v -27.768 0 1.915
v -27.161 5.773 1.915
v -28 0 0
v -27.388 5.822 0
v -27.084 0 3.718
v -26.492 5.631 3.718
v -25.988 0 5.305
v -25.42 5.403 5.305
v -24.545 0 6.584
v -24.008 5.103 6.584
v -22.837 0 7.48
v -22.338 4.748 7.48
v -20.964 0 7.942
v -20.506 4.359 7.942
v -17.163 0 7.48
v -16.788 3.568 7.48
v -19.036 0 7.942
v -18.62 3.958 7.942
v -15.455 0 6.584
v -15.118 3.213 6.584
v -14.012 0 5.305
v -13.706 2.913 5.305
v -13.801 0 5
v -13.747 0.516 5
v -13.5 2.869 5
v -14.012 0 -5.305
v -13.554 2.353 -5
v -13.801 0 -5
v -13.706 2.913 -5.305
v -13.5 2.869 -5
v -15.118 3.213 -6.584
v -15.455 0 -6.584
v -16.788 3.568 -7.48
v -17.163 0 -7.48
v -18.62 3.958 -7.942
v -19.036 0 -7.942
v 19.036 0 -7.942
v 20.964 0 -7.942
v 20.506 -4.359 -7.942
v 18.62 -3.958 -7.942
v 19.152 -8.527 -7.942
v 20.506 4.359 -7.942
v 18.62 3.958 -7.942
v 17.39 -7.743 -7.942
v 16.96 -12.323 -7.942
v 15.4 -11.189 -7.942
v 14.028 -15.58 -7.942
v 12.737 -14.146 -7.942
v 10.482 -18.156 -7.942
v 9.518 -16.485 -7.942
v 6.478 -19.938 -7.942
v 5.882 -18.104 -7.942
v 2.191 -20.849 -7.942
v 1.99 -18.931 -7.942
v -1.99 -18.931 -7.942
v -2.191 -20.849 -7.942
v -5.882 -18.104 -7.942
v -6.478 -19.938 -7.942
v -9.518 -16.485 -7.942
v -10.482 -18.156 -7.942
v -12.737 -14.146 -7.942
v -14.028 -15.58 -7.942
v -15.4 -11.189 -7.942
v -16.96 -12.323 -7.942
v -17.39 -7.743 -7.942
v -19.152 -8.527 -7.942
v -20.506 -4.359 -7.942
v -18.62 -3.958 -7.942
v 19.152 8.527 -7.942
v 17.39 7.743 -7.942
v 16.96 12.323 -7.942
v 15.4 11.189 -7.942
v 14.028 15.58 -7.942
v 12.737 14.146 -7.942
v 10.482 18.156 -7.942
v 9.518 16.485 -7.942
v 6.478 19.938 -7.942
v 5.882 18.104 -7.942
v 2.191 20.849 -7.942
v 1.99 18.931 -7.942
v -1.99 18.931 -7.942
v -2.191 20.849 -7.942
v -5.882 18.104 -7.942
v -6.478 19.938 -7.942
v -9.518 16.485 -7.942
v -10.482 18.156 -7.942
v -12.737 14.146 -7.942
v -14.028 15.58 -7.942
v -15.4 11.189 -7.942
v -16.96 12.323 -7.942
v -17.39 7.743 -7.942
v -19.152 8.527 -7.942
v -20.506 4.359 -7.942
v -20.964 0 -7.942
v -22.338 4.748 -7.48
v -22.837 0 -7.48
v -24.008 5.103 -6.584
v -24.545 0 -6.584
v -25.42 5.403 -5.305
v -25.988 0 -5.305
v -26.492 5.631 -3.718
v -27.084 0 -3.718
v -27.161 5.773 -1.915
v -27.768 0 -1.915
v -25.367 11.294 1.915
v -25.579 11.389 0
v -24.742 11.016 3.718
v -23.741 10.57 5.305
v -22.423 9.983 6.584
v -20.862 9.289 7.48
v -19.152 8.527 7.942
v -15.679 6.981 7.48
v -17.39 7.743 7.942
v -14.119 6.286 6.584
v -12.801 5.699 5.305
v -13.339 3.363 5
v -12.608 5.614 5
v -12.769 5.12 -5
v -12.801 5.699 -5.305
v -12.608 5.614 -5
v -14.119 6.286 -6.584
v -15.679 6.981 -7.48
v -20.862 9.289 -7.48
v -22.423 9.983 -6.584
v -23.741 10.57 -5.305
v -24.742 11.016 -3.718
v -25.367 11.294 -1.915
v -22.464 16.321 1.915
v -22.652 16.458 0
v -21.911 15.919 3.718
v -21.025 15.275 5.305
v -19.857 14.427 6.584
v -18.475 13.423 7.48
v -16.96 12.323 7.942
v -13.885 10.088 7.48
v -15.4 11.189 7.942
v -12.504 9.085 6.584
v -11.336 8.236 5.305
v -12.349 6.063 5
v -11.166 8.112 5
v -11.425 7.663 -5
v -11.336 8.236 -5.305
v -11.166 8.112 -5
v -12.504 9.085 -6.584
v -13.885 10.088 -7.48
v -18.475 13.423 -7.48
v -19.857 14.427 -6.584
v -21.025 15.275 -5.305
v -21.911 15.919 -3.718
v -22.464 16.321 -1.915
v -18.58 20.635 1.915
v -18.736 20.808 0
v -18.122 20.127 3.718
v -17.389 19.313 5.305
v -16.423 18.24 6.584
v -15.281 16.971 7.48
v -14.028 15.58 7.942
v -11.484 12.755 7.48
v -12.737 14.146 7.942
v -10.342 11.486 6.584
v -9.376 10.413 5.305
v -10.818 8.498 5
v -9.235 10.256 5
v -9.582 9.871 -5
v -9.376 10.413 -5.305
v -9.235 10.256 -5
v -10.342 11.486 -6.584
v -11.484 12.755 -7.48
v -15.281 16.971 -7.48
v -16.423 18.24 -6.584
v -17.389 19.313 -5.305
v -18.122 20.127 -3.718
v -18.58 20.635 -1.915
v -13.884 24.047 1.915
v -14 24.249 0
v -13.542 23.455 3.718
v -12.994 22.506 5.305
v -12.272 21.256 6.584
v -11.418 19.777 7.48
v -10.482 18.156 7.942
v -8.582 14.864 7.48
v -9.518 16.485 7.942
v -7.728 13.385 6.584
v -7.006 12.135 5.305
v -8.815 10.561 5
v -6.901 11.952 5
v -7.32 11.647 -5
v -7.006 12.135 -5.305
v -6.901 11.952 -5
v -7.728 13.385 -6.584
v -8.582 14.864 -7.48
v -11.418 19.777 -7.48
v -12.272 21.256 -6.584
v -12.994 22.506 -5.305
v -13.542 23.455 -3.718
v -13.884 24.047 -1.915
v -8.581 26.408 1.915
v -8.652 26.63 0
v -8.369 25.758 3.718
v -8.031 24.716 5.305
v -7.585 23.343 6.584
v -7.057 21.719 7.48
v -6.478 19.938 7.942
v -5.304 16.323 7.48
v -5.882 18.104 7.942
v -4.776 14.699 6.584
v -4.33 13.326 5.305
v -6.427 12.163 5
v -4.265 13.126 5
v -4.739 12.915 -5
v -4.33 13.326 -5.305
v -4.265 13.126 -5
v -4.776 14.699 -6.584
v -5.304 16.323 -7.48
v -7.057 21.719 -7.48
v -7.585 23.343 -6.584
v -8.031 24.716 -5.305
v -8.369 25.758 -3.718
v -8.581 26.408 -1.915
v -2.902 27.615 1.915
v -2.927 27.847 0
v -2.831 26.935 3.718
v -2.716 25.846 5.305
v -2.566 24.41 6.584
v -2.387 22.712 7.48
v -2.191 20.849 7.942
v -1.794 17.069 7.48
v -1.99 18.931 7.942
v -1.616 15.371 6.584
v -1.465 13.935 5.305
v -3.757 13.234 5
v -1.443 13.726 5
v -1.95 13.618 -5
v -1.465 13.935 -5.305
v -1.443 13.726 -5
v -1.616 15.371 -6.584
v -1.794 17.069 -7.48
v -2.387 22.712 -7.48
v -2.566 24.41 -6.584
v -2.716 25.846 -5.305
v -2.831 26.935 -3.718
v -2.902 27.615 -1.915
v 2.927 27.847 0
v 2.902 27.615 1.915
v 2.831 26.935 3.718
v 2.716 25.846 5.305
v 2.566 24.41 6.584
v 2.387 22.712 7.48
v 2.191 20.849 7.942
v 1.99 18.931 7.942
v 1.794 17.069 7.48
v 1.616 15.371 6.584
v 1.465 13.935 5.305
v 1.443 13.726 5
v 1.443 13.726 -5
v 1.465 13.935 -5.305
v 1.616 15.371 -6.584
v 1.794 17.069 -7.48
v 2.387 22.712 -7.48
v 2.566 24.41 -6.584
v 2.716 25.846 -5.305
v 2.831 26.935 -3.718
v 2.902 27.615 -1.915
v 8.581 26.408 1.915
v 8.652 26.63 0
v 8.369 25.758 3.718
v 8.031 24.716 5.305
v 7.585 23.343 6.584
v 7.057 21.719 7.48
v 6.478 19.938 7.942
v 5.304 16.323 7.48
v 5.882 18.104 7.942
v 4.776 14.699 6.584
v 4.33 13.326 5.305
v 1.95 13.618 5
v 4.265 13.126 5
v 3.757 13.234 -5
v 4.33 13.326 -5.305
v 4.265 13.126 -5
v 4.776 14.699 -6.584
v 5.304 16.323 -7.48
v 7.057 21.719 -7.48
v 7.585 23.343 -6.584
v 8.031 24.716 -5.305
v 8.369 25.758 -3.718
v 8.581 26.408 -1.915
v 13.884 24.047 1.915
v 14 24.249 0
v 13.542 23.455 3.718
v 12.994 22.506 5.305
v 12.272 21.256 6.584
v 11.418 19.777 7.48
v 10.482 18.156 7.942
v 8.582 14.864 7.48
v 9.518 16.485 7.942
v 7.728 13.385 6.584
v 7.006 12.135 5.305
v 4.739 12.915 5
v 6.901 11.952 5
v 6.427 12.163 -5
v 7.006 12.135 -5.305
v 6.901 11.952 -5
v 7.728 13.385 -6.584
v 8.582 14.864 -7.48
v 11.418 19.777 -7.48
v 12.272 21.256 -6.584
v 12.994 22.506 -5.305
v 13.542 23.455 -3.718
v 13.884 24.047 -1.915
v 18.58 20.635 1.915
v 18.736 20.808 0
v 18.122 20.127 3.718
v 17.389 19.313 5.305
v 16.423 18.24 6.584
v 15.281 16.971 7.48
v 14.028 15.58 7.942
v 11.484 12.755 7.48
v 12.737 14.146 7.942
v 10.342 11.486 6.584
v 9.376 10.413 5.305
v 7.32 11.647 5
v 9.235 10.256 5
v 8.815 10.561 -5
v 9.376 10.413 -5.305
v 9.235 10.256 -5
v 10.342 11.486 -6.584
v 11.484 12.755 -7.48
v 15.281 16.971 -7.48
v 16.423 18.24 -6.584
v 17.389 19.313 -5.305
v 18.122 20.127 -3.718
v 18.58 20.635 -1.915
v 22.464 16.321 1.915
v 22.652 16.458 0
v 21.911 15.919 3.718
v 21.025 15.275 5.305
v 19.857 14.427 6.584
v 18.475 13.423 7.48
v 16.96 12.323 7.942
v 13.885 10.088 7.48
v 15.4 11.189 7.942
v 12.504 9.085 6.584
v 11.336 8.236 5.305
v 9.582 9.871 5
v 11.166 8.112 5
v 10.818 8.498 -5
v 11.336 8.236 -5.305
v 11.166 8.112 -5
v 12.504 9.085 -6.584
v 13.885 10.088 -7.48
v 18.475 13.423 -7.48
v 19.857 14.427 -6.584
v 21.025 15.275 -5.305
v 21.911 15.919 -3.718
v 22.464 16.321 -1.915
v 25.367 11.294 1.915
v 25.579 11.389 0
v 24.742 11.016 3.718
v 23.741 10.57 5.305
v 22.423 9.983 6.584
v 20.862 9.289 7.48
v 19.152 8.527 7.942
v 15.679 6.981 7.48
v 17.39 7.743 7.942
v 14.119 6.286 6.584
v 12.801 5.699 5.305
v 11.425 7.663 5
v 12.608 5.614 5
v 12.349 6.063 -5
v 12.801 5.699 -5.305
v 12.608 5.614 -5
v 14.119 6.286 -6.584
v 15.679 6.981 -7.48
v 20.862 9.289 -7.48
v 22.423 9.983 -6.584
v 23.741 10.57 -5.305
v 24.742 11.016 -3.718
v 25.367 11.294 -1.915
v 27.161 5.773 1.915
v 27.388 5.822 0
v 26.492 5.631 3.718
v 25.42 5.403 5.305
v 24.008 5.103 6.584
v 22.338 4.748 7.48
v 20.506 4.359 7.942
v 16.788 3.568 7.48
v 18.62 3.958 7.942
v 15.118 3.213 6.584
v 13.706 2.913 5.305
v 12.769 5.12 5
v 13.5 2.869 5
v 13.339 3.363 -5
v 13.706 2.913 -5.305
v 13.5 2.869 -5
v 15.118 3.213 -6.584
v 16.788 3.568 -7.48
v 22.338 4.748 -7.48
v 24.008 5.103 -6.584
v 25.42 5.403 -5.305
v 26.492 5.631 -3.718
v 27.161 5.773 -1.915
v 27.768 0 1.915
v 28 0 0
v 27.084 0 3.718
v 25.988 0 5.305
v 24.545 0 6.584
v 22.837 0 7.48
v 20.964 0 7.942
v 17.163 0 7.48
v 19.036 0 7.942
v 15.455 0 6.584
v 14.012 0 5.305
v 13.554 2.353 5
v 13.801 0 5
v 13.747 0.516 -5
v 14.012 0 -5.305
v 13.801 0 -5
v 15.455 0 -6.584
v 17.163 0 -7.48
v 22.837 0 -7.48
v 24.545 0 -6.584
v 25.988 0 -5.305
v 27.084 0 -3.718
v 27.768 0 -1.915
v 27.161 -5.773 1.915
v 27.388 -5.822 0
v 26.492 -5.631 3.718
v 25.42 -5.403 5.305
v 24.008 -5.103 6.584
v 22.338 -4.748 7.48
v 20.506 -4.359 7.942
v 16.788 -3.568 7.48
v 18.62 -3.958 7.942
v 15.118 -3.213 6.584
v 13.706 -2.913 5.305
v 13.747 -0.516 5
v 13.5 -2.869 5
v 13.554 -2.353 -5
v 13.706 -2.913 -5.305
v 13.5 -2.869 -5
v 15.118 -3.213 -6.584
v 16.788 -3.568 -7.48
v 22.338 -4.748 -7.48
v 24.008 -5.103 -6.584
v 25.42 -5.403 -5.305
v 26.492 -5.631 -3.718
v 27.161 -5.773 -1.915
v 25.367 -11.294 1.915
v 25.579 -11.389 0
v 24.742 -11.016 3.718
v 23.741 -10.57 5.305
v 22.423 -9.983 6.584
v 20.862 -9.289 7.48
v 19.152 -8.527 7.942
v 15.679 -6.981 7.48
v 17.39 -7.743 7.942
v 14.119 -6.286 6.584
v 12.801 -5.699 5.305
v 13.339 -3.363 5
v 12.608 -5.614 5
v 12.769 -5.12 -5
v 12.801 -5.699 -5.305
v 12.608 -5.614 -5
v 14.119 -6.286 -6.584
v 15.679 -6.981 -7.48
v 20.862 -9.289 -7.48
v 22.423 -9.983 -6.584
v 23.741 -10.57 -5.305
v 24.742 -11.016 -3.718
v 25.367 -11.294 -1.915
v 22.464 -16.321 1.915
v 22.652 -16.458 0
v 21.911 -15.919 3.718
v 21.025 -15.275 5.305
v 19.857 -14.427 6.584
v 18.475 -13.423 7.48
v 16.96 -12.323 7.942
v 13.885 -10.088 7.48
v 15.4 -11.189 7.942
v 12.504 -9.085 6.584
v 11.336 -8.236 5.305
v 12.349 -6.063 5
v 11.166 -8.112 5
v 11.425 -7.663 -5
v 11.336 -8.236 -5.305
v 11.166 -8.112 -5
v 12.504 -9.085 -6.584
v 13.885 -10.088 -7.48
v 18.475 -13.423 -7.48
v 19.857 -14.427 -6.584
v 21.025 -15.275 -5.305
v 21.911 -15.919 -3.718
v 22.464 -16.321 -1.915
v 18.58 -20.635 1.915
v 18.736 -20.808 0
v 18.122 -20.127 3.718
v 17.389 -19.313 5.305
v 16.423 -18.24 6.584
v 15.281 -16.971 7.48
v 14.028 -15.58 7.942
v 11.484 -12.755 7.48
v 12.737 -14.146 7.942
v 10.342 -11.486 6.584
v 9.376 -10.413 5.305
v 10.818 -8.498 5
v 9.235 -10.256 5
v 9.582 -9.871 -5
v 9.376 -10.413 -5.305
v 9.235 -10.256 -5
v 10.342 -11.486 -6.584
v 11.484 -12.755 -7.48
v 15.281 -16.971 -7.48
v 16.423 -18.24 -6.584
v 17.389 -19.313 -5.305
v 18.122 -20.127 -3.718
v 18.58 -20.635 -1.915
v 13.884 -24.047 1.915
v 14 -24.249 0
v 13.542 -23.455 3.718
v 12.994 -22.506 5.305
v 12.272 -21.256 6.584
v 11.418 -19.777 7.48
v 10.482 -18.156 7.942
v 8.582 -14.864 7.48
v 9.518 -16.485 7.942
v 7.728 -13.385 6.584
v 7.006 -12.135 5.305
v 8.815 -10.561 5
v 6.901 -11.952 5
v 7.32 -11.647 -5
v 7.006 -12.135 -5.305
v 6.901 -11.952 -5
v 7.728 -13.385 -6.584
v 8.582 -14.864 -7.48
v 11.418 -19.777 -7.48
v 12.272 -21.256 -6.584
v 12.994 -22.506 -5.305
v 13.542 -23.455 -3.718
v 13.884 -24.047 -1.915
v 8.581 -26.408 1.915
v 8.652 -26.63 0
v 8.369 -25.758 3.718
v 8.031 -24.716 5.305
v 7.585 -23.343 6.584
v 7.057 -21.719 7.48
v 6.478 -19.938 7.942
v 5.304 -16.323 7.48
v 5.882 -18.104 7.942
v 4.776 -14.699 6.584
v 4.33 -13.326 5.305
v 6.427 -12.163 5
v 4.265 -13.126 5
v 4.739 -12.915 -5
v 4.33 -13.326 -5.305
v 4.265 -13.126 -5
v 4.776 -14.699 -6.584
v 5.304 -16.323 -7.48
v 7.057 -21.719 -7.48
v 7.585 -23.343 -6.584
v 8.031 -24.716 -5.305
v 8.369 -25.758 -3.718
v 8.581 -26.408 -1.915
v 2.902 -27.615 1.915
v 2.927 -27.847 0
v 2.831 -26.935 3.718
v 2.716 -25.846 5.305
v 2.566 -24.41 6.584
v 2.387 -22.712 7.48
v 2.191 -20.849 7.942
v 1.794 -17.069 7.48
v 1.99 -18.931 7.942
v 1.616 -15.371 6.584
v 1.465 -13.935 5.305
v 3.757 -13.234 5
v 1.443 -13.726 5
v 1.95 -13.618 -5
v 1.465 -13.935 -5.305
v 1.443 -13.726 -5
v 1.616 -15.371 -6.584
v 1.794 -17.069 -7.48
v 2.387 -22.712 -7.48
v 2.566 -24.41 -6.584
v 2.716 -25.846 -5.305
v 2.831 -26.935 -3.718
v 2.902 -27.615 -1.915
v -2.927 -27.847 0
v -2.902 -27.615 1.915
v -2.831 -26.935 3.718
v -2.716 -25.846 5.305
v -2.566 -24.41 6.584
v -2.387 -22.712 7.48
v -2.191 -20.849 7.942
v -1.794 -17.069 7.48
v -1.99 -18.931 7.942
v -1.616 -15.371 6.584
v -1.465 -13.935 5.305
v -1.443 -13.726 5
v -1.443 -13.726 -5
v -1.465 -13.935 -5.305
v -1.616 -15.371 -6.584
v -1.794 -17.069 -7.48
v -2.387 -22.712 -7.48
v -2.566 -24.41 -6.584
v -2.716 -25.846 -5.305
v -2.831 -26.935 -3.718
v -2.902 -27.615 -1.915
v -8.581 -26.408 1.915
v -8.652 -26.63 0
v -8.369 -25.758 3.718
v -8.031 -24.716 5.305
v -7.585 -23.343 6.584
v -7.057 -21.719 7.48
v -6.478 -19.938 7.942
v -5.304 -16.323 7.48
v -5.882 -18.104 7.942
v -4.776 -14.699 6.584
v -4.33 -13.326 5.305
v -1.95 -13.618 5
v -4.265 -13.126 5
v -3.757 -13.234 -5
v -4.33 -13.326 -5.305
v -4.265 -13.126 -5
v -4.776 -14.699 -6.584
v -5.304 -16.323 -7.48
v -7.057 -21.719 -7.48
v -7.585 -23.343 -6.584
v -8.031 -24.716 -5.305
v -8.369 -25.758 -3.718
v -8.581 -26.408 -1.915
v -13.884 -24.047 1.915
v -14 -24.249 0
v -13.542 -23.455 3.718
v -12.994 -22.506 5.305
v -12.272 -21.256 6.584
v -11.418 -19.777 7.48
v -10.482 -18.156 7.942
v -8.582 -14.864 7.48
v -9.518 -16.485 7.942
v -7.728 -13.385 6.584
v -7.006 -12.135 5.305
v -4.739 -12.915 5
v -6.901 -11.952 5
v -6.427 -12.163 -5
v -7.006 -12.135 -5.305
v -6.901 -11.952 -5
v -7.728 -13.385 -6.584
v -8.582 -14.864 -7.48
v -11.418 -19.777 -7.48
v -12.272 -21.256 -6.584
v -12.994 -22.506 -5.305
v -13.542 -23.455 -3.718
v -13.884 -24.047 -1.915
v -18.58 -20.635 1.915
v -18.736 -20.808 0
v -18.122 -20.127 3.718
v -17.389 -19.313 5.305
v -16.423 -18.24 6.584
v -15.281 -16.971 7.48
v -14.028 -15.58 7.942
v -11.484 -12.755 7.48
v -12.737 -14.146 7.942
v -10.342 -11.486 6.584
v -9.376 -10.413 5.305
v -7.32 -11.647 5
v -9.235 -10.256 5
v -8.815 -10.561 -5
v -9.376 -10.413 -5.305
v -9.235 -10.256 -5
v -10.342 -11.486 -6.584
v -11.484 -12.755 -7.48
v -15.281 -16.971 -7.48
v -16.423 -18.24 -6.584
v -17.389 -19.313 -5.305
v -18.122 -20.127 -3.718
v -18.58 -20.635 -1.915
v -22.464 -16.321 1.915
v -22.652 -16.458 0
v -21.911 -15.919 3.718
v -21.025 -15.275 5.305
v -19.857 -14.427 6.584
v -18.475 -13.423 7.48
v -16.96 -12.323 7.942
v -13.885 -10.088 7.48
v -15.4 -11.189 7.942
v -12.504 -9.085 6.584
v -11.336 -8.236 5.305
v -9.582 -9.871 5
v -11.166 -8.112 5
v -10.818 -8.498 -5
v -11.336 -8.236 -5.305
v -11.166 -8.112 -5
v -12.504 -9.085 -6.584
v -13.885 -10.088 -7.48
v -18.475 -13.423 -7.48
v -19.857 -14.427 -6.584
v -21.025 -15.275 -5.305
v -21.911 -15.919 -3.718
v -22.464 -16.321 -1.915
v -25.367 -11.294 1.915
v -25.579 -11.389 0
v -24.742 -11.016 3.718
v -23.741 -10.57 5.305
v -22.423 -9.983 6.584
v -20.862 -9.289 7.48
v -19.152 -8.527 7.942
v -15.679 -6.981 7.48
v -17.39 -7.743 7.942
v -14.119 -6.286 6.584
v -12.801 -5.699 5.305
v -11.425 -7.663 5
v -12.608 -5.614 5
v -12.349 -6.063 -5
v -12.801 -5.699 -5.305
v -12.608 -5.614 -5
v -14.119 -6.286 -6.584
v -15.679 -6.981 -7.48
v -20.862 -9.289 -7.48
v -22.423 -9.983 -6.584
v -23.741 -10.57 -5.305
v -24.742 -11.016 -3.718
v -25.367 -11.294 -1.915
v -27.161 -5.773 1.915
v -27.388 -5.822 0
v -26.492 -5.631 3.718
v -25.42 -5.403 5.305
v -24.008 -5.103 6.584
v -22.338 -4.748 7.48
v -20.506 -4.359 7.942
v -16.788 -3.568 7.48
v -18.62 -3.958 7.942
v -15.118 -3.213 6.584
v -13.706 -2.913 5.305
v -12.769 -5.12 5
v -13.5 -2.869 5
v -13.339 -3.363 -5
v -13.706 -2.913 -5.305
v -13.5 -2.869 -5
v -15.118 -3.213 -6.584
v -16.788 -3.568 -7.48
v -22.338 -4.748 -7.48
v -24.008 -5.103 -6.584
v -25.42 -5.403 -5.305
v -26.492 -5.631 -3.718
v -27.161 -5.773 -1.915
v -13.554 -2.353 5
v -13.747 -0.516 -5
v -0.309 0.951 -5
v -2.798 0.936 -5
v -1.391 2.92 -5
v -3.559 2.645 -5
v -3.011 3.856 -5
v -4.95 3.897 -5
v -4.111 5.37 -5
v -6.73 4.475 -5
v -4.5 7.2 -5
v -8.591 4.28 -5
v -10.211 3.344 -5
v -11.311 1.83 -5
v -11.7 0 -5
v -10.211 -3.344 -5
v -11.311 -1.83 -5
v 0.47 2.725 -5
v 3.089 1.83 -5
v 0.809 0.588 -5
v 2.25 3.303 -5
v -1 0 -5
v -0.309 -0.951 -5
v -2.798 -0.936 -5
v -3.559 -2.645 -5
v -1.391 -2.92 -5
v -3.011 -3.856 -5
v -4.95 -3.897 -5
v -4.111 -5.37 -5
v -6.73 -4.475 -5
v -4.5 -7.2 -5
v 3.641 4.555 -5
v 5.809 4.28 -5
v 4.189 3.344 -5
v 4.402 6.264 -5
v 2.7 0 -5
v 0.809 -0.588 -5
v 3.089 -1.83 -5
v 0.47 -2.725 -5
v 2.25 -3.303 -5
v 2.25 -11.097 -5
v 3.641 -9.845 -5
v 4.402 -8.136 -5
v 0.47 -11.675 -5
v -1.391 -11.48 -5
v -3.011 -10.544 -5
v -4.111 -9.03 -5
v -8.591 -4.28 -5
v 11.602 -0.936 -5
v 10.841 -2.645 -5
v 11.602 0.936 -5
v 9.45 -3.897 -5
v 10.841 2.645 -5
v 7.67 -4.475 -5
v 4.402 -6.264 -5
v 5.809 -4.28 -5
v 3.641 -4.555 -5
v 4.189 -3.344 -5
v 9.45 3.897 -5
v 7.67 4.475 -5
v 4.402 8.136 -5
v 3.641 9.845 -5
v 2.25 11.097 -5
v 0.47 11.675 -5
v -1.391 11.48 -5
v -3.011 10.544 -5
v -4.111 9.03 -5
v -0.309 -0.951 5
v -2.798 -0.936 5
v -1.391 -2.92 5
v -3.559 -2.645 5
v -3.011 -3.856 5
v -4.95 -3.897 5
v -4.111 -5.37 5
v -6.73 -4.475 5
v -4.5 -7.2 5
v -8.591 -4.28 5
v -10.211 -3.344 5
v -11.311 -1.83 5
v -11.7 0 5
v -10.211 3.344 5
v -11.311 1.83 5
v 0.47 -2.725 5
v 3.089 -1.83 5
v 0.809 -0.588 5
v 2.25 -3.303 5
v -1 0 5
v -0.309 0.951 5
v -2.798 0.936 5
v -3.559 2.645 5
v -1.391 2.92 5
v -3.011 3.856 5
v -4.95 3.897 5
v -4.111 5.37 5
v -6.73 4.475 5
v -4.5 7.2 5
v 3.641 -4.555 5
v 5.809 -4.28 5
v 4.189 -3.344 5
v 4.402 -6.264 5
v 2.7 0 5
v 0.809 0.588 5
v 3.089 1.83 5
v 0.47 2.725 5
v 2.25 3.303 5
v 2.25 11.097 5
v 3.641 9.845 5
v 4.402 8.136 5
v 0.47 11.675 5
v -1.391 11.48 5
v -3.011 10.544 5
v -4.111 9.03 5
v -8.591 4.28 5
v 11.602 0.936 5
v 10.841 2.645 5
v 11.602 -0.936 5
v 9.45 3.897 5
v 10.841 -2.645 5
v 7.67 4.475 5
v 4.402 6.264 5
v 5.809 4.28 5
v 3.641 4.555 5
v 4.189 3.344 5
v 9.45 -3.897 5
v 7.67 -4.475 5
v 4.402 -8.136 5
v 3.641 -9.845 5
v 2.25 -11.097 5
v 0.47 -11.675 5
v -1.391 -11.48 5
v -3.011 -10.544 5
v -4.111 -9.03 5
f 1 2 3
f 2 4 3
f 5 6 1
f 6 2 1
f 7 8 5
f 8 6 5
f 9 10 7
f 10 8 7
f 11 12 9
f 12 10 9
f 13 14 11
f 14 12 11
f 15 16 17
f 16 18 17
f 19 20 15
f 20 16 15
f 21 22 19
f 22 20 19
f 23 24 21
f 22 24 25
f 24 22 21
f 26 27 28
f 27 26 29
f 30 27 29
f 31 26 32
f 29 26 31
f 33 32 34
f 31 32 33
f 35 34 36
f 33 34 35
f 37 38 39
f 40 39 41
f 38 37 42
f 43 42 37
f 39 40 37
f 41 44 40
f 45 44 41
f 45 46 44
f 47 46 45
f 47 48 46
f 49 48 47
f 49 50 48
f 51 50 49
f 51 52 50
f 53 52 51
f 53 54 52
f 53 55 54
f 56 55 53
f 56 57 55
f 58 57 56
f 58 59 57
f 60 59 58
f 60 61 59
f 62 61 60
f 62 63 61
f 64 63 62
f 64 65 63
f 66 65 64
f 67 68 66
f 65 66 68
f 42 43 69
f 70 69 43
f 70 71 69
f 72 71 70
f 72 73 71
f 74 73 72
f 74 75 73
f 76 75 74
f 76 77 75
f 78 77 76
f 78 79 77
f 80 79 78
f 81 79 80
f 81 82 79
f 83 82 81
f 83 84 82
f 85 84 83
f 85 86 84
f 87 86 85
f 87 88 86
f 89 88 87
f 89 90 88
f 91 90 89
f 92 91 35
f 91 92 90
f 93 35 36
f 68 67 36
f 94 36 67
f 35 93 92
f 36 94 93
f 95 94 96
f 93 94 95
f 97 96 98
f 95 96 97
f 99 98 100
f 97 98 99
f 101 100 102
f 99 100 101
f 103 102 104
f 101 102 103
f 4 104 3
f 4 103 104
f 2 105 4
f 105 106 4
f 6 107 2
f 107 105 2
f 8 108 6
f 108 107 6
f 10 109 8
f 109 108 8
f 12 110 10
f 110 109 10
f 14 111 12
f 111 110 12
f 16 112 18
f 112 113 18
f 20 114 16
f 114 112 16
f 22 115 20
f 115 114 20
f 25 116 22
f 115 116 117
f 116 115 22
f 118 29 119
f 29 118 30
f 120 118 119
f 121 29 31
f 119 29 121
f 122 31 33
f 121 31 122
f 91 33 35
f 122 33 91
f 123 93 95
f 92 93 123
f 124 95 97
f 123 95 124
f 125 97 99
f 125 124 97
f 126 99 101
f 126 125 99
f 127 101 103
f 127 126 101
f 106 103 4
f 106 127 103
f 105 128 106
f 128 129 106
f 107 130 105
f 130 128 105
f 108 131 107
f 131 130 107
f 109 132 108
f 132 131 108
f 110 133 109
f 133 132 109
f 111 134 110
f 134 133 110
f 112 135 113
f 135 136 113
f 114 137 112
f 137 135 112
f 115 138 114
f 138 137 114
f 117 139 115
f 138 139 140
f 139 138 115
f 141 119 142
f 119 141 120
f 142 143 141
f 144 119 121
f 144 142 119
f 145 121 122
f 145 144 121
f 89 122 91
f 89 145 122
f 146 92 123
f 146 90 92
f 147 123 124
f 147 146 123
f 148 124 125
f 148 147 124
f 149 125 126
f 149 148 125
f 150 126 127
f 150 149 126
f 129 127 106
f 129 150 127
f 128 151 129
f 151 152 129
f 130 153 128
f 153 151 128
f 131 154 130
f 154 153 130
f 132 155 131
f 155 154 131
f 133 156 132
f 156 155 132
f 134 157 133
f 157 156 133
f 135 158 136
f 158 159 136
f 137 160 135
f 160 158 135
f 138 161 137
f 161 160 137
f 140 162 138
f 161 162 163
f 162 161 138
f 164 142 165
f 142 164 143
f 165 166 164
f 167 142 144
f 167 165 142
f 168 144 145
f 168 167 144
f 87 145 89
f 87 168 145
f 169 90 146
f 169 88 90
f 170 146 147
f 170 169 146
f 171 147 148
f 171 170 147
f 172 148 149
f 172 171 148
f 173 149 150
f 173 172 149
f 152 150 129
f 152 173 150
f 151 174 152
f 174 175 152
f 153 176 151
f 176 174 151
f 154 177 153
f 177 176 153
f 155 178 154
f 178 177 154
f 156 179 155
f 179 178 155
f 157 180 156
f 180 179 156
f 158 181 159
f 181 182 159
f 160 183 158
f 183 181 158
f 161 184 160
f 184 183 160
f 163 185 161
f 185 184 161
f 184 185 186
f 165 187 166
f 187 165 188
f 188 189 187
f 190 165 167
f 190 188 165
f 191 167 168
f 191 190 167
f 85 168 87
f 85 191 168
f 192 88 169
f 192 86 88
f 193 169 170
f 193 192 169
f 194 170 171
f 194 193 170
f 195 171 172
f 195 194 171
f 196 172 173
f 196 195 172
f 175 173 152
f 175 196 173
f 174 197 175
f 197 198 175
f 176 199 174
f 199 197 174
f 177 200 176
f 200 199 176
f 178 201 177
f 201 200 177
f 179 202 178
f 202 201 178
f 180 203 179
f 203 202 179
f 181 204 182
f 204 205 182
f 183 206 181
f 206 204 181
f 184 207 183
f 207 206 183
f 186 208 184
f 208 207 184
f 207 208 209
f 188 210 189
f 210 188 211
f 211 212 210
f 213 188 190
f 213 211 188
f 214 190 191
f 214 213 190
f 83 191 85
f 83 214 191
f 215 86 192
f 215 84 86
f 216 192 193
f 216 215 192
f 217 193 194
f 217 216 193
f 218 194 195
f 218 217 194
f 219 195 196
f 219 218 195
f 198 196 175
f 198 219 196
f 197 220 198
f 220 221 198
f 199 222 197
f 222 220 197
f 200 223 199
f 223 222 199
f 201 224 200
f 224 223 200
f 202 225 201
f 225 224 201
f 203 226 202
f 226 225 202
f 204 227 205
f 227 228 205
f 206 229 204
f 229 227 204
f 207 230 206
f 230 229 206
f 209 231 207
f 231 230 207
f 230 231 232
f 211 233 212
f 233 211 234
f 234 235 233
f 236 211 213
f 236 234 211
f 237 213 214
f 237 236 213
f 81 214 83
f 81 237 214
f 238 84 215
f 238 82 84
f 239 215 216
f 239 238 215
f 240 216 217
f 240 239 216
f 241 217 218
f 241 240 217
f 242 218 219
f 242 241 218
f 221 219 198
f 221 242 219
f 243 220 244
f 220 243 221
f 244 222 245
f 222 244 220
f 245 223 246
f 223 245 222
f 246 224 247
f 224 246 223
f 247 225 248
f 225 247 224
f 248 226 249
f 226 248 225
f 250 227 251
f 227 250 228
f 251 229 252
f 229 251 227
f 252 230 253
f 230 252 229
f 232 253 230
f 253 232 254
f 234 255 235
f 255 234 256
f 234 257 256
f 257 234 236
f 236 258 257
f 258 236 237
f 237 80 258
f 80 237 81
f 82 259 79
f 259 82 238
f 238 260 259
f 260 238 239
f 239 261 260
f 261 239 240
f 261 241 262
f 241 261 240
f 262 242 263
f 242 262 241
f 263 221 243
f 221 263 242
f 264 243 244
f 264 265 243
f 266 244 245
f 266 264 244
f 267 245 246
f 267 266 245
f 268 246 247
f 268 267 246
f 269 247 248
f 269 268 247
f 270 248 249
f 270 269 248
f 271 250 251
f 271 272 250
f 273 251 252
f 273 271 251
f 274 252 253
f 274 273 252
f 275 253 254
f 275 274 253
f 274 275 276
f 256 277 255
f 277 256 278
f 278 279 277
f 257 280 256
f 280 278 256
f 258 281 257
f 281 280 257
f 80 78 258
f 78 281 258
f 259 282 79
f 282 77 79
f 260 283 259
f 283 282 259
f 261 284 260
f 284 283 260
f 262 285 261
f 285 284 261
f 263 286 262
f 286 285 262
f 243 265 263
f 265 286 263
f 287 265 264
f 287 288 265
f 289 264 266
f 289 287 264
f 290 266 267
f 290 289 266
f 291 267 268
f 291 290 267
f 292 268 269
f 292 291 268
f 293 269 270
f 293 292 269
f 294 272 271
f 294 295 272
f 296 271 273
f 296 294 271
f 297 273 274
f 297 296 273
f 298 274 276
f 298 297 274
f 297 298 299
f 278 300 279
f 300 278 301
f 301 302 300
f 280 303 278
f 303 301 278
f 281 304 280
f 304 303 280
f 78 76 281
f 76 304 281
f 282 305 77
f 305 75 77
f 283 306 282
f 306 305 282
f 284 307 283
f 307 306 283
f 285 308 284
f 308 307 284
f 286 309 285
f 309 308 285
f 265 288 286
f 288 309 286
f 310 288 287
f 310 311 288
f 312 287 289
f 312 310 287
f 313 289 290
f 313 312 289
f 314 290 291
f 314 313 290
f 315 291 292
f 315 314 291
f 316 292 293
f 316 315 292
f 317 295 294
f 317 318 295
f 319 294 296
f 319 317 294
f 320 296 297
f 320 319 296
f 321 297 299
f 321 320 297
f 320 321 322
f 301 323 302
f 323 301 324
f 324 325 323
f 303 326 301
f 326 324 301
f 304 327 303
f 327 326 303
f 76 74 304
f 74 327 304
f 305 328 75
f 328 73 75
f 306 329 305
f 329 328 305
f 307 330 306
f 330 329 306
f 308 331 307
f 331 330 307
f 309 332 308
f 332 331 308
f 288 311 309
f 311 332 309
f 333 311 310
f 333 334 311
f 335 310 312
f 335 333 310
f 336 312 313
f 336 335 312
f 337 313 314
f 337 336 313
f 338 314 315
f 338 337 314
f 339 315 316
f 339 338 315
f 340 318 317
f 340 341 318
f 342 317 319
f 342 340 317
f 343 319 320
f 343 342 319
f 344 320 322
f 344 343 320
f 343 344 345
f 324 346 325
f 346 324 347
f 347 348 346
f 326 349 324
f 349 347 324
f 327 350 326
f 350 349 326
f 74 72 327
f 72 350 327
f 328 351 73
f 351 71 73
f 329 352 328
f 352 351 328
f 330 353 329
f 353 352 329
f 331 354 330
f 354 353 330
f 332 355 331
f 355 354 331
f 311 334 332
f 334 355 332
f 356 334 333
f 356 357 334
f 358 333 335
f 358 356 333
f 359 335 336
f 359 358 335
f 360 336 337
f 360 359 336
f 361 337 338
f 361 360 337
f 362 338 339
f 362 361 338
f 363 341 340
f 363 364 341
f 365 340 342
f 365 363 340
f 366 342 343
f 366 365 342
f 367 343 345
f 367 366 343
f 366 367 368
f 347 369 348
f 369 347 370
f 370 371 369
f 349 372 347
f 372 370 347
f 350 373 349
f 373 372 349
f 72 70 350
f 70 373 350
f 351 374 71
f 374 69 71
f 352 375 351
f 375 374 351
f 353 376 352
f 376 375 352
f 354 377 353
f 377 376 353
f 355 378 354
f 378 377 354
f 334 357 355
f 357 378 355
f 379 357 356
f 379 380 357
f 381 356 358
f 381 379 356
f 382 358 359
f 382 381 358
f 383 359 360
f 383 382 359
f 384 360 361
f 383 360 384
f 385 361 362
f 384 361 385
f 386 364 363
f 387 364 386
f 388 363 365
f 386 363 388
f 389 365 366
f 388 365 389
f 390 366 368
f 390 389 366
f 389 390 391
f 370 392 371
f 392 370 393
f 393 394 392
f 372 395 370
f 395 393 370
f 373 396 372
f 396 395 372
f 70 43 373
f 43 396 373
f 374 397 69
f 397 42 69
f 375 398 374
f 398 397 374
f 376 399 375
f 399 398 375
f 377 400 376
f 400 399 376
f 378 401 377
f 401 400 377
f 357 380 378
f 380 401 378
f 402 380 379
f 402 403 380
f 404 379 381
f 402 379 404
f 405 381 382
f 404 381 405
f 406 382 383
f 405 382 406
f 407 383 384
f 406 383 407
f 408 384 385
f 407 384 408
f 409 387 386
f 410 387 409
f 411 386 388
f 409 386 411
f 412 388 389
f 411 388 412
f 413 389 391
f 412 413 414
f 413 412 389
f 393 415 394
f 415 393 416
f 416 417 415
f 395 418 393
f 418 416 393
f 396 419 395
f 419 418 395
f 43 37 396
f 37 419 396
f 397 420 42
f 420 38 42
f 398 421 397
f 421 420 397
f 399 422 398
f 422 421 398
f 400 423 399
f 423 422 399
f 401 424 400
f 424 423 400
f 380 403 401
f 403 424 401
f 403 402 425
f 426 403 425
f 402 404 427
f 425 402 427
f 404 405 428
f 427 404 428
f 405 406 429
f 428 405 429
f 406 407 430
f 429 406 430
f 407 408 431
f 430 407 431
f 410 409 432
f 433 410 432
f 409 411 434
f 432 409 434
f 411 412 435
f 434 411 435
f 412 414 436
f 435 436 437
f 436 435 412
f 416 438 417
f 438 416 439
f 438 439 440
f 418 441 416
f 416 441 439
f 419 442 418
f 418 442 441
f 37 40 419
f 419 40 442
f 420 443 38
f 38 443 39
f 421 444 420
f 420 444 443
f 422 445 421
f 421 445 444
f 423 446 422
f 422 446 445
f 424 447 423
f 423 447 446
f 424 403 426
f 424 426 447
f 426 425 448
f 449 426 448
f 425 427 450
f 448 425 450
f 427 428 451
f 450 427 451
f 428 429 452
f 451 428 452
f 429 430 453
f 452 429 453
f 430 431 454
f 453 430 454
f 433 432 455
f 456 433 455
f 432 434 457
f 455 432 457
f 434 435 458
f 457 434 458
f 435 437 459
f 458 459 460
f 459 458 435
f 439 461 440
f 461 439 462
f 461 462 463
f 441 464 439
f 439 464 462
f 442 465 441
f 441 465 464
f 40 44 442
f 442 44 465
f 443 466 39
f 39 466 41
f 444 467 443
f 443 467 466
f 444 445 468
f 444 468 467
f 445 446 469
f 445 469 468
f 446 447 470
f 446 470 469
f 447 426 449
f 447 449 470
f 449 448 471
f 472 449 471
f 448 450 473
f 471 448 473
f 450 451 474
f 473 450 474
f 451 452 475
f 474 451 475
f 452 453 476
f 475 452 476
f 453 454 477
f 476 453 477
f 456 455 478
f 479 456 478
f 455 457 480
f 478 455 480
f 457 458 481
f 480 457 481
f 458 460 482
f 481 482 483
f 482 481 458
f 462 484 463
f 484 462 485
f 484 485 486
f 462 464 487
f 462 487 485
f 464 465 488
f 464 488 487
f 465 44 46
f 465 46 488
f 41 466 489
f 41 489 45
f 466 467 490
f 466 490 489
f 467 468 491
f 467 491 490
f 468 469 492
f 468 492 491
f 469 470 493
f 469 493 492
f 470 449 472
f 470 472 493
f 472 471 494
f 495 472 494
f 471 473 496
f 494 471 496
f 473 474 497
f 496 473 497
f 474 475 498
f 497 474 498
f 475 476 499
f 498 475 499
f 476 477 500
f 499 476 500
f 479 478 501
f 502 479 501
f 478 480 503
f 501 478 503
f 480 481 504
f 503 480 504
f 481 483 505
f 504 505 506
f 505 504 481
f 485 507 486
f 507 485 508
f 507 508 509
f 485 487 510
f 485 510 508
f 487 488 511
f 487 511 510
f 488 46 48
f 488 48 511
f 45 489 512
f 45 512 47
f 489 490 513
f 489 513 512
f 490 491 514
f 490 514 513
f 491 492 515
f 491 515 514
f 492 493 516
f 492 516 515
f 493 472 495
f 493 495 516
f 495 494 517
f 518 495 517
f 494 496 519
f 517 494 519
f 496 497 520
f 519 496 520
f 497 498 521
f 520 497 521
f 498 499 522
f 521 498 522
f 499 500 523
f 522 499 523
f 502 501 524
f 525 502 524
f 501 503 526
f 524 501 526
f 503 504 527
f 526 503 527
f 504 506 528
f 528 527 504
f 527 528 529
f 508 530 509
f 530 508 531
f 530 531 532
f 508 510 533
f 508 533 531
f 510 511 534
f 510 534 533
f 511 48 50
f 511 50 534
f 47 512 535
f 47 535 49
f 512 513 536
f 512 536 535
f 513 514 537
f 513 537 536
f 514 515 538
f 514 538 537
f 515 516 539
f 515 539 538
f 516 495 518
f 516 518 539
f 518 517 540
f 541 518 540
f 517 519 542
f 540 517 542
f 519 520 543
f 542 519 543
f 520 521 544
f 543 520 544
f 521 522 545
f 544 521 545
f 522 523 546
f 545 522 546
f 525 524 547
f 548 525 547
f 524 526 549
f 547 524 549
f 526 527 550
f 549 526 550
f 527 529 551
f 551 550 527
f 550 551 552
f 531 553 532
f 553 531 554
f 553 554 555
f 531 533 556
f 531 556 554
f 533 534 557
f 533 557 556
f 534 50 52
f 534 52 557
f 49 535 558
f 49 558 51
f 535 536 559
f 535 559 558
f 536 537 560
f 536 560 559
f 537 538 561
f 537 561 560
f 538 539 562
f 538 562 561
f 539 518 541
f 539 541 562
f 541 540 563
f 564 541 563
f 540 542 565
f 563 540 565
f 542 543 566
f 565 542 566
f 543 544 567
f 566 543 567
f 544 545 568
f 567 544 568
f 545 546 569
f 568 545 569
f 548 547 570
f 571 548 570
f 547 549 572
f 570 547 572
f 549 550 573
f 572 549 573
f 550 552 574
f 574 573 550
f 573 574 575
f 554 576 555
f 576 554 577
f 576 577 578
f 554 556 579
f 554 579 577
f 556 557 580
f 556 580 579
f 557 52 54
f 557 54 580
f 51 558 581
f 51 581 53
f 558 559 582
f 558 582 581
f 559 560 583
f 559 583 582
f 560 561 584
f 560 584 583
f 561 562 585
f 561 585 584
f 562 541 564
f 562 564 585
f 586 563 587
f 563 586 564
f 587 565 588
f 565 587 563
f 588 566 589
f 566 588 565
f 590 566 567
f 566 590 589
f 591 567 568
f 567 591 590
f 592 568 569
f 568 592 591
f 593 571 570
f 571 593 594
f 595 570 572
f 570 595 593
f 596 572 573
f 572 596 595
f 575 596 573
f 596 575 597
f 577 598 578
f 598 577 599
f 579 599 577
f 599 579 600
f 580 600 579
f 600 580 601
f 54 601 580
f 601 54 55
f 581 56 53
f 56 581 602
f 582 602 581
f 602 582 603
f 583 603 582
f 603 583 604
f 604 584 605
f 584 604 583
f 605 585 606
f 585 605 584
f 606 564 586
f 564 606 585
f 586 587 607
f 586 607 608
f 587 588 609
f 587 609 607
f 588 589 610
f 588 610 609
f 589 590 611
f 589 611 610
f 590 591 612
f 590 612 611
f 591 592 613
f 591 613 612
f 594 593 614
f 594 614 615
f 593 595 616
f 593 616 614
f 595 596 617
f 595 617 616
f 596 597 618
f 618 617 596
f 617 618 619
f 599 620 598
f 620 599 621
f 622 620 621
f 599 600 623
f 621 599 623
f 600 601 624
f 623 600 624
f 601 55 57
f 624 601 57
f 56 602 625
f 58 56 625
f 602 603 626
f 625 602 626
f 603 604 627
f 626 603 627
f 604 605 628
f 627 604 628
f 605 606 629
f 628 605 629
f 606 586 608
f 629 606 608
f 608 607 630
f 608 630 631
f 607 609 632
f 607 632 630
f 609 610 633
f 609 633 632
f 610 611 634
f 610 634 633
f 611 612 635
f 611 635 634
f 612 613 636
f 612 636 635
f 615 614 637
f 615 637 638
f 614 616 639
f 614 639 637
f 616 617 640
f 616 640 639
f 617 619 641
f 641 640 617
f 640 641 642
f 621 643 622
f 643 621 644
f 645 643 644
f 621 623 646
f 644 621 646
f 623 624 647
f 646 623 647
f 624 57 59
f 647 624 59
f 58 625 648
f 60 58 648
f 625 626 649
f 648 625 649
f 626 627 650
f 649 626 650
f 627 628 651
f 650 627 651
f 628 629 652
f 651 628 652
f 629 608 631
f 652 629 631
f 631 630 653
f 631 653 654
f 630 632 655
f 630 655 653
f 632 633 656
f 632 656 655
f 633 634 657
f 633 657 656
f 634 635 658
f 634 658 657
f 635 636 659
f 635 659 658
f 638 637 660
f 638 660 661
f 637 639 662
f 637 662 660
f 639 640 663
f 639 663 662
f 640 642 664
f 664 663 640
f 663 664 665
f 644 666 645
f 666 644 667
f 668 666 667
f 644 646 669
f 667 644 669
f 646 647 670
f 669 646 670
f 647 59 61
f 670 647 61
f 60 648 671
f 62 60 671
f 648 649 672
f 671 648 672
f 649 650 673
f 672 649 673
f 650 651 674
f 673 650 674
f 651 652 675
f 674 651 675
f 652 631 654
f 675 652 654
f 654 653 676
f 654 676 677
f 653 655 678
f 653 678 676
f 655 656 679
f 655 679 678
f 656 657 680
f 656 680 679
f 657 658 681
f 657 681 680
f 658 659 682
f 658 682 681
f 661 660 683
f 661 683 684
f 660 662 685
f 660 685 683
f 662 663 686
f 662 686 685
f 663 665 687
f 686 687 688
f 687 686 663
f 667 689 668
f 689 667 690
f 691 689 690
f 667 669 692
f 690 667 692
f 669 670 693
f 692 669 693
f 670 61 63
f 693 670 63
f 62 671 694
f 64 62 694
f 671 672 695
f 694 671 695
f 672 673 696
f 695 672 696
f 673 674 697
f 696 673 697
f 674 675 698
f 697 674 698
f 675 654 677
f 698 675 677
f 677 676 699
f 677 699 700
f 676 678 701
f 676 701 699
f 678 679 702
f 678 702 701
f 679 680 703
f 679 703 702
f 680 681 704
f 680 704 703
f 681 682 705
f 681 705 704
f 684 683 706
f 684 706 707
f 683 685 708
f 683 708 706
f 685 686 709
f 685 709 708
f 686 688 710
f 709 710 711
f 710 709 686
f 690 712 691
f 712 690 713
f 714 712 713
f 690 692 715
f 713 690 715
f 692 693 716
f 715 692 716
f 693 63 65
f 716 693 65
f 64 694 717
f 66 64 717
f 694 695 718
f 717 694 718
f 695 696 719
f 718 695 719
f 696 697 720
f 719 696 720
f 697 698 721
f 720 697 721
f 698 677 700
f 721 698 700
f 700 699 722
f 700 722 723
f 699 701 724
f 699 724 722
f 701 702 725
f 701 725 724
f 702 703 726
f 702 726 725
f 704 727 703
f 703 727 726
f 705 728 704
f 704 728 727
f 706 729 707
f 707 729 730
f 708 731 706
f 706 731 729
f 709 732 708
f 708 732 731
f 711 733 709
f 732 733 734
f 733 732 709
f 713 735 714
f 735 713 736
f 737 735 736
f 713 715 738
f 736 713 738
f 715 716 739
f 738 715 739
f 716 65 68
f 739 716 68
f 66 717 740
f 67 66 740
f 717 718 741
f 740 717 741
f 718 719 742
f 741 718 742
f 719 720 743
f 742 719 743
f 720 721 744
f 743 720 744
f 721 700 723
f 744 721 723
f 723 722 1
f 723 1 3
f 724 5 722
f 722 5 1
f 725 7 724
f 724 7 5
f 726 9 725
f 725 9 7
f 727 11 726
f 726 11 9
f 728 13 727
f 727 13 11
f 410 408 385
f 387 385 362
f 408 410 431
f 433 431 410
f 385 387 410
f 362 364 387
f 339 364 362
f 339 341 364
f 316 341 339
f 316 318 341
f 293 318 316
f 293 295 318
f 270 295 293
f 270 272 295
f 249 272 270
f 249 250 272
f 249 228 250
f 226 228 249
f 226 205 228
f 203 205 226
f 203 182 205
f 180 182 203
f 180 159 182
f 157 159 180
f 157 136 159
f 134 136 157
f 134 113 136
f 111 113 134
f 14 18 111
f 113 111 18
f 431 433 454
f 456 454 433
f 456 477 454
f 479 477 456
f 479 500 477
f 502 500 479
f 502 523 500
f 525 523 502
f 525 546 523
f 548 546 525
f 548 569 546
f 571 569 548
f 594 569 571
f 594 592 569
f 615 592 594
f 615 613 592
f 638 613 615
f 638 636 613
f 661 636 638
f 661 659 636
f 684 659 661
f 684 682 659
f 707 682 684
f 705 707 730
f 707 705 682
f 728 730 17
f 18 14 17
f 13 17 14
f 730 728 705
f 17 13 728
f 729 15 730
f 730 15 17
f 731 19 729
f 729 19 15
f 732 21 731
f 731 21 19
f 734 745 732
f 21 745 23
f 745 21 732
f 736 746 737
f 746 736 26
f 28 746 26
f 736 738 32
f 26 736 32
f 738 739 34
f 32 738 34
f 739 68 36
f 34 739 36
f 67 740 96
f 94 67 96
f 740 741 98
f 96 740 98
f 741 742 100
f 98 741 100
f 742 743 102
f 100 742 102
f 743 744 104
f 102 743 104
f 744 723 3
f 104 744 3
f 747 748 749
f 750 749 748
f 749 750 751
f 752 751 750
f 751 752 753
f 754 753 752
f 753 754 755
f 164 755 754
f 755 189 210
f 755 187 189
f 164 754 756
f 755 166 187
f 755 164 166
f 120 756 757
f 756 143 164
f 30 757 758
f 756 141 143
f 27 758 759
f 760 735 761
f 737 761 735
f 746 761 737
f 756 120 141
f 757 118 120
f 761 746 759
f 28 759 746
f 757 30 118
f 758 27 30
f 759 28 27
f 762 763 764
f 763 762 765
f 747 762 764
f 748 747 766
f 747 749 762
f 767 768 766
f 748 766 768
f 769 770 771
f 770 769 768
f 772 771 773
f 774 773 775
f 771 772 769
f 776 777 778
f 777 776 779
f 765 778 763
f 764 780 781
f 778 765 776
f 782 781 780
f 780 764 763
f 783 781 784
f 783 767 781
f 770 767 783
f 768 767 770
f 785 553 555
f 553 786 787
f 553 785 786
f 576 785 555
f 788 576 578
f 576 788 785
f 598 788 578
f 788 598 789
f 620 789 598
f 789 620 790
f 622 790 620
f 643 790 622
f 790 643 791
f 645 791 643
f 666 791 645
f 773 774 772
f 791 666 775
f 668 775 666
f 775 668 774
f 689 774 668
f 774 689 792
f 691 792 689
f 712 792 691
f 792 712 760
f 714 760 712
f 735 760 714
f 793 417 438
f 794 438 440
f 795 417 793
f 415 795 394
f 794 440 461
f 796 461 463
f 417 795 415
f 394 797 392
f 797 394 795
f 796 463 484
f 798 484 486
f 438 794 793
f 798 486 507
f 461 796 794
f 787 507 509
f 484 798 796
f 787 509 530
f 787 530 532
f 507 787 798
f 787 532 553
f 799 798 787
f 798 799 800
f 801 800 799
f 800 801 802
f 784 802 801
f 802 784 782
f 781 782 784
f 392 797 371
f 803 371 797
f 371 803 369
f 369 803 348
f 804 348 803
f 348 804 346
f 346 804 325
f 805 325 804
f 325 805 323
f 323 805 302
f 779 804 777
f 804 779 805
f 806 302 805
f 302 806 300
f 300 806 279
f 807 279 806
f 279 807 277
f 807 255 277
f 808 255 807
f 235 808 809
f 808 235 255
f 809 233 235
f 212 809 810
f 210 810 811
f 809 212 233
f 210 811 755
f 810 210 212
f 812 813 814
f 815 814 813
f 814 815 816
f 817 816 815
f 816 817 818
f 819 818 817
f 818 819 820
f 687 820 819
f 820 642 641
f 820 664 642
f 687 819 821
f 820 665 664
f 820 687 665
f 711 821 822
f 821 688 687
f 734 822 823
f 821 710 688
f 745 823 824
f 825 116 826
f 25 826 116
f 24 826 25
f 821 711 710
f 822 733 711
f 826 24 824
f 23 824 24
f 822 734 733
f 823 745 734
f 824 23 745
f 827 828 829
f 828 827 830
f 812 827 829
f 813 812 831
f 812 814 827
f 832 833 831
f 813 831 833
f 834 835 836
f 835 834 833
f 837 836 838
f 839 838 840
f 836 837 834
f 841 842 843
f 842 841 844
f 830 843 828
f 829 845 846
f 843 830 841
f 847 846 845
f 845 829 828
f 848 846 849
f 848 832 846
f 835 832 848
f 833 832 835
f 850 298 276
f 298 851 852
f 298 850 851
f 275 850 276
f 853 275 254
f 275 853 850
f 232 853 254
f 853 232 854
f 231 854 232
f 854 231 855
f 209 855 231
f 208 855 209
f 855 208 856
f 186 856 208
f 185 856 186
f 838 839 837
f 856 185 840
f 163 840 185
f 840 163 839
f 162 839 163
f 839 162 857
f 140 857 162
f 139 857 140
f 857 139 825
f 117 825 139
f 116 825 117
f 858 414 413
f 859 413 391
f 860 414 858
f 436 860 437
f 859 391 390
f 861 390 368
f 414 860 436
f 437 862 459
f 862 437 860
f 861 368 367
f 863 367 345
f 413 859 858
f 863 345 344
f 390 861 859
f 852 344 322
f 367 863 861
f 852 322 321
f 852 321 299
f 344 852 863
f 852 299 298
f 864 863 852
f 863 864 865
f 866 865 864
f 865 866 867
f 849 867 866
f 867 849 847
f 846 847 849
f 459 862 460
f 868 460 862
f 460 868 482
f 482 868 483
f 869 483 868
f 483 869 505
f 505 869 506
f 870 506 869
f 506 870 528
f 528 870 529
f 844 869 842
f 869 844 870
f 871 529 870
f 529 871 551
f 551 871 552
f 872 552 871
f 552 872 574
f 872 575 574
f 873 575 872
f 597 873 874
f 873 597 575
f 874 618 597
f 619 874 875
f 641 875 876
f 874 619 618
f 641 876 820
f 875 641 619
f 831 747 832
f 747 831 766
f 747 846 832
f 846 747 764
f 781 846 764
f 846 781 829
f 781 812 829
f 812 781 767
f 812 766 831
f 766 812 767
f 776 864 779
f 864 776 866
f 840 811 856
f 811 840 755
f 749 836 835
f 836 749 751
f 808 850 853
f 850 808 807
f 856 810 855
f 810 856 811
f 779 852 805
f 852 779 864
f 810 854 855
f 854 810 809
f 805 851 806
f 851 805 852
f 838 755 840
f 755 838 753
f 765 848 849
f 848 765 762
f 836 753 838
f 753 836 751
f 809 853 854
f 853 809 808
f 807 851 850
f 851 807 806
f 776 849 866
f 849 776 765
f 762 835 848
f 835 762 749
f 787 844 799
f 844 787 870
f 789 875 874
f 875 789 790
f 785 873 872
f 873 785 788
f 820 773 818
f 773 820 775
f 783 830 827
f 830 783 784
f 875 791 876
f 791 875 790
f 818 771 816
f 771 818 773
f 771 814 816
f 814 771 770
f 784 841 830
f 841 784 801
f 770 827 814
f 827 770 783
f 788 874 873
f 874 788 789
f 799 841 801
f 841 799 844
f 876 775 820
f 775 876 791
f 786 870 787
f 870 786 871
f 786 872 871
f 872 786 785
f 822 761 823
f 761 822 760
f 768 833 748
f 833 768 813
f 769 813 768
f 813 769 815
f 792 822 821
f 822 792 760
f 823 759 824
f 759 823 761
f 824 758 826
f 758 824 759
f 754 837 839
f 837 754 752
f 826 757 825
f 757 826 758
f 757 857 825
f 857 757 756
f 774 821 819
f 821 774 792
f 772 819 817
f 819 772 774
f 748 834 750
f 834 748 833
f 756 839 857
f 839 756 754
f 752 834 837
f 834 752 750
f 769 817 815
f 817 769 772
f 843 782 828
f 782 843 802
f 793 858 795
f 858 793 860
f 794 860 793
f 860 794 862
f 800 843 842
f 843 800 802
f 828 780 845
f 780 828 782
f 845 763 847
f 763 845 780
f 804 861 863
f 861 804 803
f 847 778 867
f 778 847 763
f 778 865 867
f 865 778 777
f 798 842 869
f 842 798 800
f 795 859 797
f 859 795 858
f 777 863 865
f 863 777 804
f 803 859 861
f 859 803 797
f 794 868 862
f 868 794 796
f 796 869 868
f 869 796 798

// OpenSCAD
WHEEL_DIAM = 30;
WHEEL_WIDTH = 12;
AXLE_DIAM = 2;
HOLE_DIAM = 9;

difference () {
	union () {
		rotate_extrude(convexity = 10)
			translate([20, 0, 0])
				circle(r = 8); 
		translate([0, 0, -5])
			cylinder (h = 10, r = 20);
	};
	rotate ([0,90,0]){
	rotate ([0,90,0])
		translate([ 0, 0, -(WHEEL_WIDTH + 1)/2])
			cylinder(h = WHEEL_WIDTH + 1, d = AXLE_DIAM);
	rotate ([0,90,0])
		translate([ 0, 3 * WHEEL_WIDTH/5, -(WHEEL_WIDTH + 1)/2])
			cylinder(h = WHEEL_WIDTH + 1, d=HOLE_DIAM);
	rotate ([0,90,0])
		translate([ 0, - 3 * WHEEL_WIDTH/5, -(WHEEL_WIDTH + 1)/2])
			cylinder(h = WHEEL_WIDTH + 1, d=HOLE_DIAM);
	rotate ([0,90,0])
		translate([ 3 * WHEEL_WIDTH/5, 0, -(WHEEL_WIDTH + 1)/2])
			cylinder(h = WHEEL_WIDTH + 1, d=HOLE_DIAM);
	rotate ([0,90,0])
		translate([ - 3 * WHEEL_WIDTH/5, 0, -(WHEEL_WIDTH + 1)/2])
			cylinder(h = WHEEL_WIDTH + 1, d=HOLE_DIAM);
	}
};
